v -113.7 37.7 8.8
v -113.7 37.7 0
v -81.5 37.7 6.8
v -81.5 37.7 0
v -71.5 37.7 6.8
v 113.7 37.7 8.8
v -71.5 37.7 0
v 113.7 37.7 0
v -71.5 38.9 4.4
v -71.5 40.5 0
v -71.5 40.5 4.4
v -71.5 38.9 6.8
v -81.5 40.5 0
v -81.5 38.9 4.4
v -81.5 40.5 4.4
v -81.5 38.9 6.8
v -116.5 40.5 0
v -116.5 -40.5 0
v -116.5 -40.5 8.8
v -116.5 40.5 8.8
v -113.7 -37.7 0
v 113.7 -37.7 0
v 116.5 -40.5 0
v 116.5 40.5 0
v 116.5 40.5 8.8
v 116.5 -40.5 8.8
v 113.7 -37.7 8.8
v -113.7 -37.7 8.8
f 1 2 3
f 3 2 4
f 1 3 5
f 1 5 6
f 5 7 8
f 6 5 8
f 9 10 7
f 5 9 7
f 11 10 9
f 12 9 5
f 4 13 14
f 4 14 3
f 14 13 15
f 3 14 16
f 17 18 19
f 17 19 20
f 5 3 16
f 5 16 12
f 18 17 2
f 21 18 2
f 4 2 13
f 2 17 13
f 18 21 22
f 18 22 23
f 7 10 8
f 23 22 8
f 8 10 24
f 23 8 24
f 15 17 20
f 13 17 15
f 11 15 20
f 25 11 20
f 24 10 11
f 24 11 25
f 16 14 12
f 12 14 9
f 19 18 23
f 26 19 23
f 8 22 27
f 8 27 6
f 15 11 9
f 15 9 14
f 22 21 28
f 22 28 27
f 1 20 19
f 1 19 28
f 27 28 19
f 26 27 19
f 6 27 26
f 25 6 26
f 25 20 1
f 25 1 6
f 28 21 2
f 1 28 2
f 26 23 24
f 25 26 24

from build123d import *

# Parameters (mm, degrees)
F0_W     = 233
F0_H     = 81
F0_W_2   = 227.4
F0_H_2   = 75.4
F1_DEPTH = 8.8
F2_W     = 10
F2_H     = 4.4
F3_DEPTH = 25
F4_W     = 10
F4_H     = 1.2
F5_DEPTH = 2.4


with BuildPart() as f1:
    # F0 (on Top) → F1 (new body)
    with BuildSketch(Plane.XY):
        Rectangle(F0_W, F0_H)
        Rectangle(F0_W_2, F0_H_2, mode=Mode.SUBTRACT)
    extrude(amount=F1_DEPTH)

    # F2 (on face) → F3 (cut)
    with BuildSketch(Plane(origin=(0, 40.5, 0), x_dir=(-1, 0, 0), z_dir=(0, 1, 0))):
        with Locations((76.5, 2.2)):
            Rectangle(F2_W, F2_H)
    extrude(amount=-F3_DEPTH, mode=Mode.SUBTRACT)

    # F4 (on face) → F5 (cut)
    with BuildSketch(Plane(origin=(0, 0, 4.4), x_dir=(1, 0, 0), z_dir=(0, 0, -1))):
        with Locations((-76.5, -38.3)):
            Rectangle(F4_W, F4_H)
    extrude(amount=-F5_DEPTH, mode=Mode.SUBTRACT)


solid = f1.part
